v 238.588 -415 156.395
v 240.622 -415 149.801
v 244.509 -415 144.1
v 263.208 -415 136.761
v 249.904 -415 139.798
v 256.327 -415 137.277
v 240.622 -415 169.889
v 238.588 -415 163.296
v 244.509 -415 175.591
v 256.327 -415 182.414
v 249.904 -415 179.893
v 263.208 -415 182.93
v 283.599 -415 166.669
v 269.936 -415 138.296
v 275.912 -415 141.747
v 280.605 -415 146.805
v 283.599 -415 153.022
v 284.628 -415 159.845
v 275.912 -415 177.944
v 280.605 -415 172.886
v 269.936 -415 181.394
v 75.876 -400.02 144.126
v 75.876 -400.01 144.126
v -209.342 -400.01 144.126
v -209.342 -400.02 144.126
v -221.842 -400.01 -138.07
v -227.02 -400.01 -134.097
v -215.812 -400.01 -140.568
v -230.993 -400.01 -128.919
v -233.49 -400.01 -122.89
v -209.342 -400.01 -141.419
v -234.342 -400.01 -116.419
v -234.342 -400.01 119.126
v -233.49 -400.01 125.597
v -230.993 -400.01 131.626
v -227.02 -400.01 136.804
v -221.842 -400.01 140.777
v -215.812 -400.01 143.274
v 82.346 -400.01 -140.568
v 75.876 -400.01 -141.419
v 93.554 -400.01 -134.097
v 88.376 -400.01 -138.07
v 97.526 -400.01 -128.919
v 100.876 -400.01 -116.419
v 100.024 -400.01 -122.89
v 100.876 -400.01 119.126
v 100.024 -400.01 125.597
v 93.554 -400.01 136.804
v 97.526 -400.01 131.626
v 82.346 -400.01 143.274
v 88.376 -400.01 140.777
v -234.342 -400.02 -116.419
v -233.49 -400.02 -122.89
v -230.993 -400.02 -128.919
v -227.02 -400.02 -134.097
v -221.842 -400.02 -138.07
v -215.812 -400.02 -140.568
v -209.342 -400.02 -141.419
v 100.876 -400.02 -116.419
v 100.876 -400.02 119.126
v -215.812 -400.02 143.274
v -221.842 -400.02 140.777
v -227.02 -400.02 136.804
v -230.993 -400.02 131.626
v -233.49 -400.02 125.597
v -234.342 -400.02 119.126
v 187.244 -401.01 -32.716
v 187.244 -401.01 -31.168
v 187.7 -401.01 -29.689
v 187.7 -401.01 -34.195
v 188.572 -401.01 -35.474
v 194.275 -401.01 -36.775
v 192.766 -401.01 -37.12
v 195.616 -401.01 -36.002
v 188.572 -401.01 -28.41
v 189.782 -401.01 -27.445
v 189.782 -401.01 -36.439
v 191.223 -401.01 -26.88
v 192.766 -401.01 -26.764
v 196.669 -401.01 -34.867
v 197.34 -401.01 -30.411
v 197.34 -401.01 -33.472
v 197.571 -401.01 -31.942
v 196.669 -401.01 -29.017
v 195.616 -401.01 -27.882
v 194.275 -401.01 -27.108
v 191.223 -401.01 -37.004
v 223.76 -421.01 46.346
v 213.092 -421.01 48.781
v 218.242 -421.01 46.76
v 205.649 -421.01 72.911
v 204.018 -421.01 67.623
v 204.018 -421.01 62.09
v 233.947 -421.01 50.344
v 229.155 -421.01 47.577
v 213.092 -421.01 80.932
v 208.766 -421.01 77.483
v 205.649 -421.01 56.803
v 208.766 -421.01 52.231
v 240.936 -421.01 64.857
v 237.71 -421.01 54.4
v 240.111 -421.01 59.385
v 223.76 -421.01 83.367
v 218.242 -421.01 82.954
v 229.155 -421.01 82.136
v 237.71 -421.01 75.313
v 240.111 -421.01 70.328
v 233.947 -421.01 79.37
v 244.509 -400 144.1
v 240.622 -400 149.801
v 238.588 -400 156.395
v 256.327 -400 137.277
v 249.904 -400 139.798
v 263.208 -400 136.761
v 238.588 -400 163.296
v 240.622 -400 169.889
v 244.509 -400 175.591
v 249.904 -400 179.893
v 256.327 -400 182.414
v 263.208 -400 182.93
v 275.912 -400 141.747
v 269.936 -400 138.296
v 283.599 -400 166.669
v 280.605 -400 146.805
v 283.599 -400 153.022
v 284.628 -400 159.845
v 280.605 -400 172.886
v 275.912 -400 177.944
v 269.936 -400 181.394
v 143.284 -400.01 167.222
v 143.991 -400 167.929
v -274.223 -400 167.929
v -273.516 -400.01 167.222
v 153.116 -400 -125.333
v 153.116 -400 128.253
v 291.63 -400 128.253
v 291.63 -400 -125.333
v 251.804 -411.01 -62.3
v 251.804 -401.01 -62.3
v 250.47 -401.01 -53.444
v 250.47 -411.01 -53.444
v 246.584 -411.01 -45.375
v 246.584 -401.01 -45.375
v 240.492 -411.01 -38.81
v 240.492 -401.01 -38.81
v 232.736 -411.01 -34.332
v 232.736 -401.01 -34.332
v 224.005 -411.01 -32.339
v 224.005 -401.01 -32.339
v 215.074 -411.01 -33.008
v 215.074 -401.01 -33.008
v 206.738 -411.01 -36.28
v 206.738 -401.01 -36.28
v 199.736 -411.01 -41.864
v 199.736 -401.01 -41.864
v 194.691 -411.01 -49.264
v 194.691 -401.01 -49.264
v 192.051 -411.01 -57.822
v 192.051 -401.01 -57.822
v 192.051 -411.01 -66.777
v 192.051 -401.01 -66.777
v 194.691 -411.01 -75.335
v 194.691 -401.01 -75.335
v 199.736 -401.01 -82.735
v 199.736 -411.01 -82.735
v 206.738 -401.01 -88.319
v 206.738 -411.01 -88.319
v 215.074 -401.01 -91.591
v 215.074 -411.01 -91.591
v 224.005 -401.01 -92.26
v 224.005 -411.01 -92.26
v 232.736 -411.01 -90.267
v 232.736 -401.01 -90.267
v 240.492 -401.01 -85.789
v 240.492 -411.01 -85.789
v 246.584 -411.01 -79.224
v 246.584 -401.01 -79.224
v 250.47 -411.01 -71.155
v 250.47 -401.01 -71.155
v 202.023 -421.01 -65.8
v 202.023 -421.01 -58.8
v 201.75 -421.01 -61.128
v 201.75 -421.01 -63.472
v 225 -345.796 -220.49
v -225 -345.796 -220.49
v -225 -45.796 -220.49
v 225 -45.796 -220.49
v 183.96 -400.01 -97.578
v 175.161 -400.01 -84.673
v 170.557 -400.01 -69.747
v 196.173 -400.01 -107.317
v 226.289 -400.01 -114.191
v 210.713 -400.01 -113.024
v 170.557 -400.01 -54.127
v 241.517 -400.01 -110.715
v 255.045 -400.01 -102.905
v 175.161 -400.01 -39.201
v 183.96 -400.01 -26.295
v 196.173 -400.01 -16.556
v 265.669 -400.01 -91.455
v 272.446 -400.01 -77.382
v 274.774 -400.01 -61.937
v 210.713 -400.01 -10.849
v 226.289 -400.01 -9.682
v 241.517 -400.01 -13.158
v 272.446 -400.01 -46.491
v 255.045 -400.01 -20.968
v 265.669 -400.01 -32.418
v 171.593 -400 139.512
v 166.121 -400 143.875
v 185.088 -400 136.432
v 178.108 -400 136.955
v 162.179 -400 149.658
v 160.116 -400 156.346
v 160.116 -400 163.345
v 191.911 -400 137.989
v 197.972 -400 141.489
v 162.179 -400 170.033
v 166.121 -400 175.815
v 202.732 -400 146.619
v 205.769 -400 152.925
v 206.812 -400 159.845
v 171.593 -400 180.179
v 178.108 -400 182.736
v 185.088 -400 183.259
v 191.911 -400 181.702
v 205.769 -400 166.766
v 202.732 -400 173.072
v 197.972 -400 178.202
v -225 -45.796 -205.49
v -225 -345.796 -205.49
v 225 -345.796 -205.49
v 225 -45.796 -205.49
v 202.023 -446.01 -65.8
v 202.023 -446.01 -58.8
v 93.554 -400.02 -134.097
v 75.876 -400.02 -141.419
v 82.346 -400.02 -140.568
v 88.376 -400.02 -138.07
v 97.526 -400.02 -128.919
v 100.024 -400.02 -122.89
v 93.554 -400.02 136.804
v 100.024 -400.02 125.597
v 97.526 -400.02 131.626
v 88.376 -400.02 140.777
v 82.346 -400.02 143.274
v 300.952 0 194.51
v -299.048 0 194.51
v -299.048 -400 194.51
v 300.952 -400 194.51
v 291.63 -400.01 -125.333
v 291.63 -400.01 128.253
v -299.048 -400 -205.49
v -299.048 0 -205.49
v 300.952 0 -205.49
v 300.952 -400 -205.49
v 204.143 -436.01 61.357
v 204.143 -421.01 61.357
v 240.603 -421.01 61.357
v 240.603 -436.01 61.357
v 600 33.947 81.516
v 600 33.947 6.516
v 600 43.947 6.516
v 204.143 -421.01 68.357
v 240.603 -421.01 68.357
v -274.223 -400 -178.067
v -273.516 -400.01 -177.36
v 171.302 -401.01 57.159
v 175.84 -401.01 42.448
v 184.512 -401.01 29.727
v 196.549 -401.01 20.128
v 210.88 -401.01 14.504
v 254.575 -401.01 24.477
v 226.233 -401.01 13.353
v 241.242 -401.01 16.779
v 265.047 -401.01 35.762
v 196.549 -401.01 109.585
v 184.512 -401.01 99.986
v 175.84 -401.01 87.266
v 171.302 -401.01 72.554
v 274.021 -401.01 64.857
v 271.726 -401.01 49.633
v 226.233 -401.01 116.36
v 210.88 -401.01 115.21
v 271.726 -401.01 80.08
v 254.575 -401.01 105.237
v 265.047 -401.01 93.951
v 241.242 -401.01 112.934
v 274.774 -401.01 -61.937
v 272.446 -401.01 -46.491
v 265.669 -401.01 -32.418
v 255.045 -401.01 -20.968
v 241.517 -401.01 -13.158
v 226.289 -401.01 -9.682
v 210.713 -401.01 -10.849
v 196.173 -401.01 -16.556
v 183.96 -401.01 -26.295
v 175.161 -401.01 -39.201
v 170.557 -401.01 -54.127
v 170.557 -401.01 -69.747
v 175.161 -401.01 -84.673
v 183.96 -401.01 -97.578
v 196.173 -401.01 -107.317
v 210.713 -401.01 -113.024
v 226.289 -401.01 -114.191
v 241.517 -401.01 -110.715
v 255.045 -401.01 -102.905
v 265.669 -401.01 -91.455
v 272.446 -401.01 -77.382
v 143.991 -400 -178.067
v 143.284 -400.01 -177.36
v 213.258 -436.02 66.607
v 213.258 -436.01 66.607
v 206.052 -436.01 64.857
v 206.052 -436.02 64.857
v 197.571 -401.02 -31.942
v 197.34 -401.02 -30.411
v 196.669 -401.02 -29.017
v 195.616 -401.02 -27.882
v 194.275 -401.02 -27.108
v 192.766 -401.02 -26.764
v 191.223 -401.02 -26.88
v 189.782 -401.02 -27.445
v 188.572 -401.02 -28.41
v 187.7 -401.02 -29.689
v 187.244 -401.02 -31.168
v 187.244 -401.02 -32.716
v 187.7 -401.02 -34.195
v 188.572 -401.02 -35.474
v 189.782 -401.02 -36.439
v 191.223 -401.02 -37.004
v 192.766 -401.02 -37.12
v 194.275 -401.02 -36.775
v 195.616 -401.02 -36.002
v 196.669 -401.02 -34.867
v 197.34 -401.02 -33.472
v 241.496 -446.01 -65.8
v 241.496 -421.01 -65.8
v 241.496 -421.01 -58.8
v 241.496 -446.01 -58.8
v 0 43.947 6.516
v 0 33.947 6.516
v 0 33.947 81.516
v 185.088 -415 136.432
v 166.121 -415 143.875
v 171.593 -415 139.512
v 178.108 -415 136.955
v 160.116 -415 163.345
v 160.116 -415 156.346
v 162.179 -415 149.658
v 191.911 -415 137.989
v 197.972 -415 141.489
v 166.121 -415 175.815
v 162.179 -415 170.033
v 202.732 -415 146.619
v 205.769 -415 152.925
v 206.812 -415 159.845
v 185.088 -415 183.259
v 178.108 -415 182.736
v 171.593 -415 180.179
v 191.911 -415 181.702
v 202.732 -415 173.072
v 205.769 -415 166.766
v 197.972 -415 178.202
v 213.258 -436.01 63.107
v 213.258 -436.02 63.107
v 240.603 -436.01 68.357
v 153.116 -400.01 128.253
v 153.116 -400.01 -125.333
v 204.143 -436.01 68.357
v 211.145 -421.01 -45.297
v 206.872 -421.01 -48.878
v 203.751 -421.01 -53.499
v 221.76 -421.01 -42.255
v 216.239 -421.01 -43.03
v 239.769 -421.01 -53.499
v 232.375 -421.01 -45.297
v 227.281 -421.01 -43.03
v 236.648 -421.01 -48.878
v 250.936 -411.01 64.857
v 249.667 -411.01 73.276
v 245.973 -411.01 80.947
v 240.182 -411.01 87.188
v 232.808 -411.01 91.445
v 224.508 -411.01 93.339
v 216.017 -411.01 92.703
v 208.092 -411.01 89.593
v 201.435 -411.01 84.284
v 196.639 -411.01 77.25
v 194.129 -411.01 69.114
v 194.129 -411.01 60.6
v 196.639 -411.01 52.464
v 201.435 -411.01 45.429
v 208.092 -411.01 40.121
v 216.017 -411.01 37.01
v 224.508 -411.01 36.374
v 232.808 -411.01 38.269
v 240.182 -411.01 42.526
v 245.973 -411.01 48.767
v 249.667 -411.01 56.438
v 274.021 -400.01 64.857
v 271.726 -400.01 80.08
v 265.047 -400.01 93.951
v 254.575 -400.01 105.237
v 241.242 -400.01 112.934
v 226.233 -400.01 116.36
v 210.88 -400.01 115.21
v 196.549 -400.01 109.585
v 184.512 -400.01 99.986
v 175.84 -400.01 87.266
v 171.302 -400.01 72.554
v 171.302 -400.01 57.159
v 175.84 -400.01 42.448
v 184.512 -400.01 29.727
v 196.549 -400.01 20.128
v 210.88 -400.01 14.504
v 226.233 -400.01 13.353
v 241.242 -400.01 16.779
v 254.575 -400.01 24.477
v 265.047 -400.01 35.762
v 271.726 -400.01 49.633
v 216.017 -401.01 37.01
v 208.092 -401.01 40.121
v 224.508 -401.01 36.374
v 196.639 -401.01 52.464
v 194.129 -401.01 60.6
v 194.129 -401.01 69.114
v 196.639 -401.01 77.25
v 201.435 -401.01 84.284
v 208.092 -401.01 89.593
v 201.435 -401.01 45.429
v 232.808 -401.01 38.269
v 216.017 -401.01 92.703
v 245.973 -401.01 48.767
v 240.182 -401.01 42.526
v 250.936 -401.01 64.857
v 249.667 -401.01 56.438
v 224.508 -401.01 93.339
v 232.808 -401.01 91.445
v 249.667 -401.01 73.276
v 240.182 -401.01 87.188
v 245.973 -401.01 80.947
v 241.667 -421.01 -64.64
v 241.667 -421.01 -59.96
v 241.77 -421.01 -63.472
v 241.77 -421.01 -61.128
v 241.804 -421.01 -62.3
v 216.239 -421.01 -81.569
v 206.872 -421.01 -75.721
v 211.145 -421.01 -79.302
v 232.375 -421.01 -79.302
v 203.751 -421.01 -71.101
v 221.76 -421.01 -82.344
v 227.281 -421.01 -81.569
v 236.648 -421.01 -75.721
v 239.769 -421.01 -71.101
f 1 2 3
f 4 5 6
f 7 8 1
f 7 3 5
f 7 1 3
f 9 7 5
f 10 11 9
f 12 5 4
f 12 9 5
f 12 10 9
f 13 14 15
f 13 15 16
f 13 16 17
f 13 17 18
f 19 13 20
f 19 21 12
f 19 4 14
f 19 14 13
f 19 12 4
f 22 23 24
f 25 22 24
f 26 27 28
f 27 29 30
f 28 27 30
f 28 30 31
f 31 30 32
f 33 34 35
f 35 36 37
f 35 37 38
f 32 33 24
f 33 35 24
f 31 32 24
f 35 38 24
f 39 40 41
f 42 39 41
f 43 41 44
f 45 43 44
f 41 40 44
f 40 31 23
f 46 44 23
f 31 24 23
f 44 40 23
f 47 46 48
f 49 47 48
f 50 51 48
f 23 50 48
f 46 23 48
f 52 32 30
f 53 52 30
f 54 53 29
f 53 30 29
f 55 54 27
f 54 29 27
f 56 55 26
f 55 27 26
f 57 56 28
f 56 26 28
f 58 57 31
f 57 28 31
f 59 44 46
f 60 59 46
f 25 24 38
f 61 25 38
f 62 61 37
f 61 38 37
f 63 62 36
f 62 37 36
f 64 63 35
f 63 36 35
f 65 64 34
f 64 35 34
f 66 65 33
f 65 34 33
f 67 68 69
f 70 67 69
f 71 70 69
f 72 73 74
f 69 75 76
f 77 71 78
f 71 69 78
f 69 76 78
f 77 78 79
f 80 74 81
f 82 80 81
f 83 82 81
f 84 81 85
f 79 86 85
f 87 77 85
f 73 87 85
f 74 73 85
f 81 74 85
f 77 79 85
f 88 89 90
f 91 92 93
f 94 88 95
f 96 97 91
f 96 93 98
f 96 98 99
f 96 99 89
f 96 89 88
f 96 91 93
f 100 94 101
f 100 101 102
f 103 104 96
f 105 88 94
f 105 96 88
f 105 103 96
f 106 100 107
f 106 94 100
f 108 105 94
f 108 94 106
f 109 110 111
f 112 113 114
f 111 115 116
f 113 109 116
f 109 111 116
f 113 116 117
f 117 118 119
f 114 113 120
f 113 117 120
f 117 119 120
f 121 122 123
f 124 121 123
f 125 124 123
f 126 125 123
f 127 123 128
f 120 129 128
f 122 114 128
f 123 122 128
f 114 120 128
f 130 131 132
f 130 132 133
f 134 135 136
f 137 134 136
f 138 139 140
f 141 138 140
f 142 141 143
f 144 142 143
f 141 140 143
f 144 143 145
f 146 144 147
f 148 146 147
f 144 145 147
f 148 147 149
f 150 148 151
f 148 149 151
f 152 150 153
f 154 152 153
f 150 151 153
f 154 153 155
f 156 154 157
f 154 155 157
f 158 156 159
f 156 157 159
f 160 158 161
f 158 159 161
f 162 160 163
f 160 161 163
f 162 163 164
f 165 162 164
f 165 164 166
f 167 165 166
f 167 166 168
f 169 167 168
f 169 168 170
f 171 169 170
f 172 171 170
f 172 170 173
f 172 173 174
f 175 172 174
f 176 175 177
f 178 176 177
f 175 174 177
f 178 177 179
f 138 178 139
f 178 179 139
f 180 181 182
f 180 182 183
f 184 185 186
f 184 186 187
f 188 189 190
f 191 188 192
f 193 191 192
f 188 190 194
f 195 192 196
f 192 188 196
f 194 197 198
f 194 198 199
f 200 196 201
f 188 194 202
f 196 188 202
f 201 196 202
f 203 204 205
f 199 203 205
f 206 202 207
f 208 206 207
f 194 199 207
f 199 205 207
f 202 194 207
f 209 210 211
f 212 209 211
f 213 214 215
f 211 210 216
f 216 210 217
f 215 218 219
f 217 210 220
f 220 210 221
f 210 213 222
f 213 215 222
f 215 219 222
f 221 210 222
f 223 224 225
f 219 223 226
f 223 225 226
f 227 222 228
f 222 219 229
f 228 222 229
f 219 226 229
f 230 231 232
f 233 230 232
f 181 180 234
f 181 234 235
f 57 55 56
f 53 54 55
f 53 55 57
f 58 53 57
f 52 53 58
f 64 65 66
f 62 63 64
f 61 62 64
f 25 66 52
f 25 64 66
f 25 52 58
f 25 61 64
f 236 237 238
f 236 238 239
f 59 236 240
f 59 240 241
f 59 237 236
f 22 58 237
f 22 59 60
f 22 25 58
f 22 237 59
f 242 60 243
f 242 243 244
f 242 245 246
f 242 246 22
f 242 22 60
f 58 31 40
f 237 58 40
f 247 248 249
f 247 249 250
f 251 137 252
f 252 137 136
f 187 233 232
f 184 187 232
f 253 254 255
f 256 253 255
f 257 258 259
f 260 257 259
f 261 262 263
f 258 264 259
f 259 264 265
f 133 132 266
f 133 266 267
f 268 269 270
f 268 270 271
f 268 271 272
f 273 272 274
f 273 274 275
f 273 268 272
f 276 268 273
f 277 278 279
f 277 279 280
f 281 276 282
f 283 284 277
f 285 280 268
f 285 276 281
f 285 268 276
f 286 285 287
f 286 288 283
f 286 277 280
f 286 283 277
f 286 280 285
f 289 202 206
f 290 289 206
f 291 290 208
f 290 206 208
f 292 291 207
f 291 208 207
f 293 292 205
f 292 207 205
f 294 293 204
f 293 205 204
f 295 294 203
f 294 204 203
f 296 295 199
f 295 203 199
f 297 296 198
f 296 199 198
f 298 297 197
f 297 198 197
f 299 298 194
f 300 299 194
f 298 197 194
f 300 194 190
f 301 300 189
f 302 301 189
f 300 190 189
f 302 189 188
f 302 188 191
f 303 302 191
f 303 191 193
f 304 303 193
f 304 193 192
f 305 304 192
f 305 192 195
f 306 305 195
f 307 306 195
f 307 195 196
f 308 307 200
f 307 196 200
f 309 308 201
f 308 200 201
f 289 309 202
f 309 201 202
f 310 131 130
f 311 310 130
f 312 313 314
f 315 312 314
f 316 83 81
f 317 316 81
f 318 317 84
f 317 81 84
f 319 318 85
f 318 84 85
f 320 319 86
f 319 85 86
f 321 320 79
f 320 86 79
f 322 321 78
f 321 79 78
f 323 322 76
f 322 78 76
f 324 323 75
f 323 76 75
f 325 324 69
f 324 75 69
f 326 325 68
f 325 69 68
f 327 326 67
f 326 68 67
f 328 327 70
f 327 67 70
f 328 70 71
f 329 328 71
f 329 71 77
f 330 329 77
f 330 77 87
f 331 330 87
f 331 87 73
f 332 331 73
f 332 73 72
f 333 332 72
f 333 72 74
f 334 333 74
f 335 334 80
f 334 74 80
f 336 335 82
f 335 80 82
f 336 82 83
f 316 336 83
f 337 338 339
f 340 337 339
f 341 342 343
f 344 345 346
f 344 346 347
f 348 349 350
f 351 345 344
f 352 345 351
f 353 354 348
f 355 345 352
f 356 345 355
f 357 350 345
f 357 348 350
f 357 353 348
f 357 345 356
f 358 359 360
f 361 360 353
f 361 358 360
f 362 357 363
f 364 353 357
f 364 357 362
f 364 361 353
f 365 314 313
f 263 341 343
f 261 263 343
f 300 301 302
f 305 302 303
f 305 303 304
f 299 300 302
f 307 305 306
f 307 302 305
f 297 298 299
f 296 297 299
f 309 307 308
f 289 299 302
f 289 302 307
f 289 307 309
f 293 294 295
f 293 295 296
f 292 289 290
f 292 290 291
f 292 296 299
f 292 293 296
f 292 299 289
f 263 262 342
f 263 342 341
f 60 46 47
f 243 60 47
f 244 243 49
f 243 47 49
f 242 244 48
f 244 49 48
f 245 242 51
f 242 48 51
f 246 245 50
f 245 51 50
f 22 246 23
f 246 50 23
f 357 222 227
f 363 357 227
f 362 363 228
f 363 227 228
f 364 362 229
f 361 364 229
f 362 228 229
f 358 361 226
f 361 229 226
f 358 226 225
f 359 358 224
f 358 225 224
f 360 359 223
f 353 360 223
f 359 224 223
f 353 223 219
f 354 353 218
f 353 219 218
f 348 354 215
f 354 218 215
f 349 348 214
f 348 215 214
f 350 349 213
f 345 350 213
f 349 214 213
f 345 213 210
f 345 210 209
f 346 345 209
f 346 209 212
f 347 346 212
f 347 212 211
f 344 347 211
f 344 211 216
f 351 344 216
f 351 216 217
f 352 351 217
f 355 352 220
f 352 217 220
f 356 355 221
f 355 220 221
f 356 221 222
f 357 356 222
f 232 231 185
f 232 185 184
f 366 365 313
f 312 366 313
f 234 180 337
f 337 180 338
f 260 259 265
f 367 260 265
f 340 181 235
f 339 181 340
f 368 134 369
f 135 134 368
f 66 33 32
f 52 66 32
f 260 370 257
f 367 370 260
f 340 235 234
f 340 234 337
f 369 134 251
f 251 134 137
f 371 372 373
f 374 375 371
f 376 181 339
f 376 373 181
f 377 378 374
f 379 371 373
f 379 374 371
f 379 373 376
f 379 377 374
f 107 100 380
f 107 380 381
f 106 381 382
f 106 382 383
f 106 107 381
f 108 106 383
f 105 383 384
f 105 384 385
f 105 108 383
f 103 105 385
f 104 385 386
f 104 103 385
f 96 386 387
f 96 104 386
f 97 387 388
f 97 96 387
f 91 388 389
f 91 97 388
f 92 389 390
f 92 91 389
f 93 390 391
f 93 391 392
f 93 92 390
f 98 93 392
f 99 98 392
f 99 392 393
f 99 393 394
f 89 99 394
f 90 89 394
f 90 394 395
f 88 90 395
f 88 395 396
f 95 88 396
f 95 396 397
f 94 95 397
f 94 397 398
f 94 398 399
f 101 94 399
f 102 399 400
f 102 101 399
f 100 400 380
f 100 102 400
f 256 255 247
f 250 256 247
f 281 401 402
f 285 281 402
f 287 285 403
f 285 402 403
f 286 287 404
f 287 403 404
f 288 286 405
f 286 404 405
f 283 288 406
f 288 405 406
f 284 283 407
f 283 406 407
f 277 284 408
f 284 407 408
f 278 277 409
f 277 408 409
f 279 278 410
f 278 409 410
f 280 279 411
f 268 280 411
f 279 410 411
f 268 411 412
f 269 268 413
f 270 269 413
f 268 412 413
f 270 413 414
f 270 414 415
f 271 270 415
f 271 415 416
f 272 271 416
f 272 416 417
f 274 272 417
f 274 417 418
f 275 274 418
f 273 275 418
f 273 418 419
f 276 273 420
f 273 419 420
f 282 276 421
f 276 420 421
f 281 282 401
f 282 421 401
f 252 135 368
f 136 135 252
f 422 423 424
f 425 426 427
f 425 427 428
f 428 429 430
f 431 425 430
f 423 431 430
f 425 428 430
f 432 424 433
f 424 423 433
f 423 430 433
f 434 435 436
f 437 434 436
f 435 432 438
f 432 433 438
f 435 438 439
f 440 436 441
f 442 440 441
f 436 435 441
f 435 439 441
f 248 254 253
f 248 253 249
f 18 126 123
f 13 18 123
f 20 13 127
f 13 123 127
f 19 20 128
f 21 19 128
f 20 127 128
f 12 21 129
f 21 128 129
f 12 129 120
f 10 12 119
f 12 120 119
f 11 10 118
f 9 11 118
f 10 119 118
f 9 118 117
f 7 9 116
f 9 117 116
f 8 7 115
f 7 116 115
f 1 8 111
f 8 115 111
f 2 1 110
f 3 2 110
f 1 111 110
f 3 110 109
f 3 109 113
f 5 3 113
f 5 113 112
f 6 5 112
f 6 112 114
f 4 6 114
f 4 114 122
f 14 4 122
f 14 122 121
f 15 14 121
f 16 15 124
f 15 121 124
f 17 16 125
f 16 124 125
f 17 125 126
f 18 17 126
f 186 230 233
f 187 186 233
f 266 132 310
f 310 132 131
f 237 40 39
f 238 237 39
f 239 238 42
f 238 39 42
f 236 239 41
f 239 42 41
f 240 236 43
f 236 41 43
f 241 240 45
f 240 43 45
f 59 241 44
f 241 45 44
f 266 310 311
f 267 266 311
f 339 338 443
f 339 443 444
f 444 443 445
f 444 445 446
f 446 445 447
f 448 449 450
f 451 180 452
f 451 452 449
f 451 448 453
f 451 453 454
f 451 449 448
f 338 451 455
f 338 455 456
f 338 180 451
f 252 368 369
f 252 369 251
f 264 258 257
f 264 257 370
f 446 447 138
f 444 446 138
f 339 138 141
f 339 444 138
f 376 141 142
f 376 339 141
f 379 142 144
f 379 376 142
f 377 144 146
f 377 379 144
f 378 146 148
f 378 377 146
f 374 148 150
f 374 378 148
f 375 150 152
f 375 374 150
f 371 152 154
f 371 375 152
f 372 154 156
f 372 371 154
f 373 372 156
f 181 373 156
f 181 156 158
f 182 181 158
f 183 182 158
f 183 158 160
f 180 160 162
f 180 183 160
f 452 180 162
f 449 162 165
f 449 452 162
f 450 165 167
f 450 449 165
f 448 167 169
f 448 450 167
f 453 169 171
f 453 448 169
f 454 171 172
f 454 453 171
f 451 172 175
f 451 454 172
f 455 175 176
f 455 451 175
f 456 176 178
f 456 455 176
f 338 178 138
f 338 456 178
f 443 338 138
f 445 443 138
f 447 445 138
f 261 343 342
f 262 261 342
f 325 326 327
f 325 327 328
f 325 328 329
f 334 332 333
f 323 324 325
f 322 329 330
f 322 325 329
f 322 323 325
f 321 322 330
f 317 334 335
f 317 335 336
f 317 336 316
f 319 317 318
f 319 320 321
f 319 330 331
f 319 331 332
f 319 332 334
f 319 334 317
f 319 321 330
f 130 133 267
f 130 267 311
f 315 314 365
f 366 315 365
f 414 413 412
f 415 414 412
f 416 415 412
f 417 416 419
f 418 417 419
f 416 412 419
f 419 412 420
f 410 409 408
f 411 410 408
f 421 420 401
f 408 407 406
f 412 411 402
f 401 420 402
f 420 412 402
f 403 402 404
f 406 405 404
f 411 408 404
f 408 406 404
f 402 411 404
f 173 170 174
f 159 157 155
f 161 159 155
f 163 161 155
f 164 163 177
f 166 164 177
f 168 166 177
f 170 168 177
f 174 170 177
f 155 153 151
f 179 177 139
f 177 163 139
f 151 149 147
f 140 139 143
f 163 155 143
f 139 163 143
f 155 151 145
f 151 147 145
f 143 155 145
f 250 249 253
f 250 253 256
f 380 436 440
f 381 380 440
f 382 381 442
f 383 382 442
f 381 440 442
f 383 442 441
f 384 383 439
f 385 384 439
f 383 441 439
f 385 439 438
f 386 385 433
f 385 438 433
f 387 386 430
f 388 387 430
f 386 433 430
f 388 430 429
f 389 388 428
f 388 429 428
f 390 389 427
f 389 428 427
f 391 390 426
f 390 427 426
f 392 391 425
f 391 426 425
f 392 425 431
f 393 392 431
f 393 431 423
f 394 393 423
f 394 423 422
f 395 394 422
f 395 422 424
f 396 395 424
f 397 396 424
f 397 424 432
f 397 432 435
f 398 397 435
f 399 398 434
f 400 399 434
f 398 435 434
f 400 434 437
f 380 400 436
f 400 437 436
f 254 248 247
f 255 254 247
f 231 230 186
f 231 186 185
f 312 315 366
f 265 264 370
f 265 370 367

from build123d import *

# Parameters (mm, degrees)
F0_W        = 600
F0_H        = 400
F1_DEPTH    = 400
F3_W        = 418.2137697935
F3_H        = 345.9964096546
F4_DEPTH    = 0.01
F5_T1_DEPTH = 349.5315899895
F5_T3_DEPTH = 421.7489501284
F7_DEPTH    = 0.01
F8_R        = 23.4792892743
F9_DEPTH    = 15
F8_R_2      = 23.149137583
F10_W       = 138.5136842728
F10_H       = 253.5866200924
F11_DEPTH   = 0.01
F12_R       = 51.6479650584
F13_DEPTH   = 1
F12_R_2     = 52.4009870451
F14_R       = 28.5626068182
F15_DEPTH   = 20
F14_R_2     = 30.0445594594
F16_SIZE    = 10
F16_2_SIZE  = 10
F17_W       = 36.4593127685
F17_H       = 7
F18_DEPTH   = 15
F19_W       = 39.4732498749
F19_H       = 7
F20_DEPTH   = 25
F21_W       = 450
F21_H       = 300
F22_DEPTH   = 15
F23_R       = 5.1925071587
F24_DEPTH   = 0.01
F26_DEPTH   = 0.01
F28_DEPTH   = 600


# Not quite as in the source:
# - a fillet or chamfer that OpenCascade refuses, or shapes differently, is made with other operations: its cross-section is extruded or revolved along the edge and cut away or added
# - a feature names something its author has since deleted; it is built from what else it names


with BuildPart() as f1:
    # F0 (on Front) → F1 (new body)
    with BuildSketch(Plane.XZ):
        with Locations((0.952295959, -5.4897558531)):
            Rectangle(F0_W, F0_H)
    extrude(amount=F1_DEPTH)


with BuildPart() as f4:
    # F3 (on face) → F4 (new body)
    with BuildSketch(Plane.XZ.offset(400)):
        with Locations((-65.1162043214, -5.0687789917)):
            Rectangle(F3_W, F3_H)
    extrude(amount=F4_DEPTH)

    # F5: fillet of radius 25 on 4 edges, made by hand

    # F5_s2 → F5_t1 (cut)
    with BuildSketch(Plane.XY.offset(-179.8345739864)):
        with BuildLine():
            ThreePointArc((143.9906805754, -400), (143.637197899, -400.007499875), (143.2836445084, -400.01))
            Line((143.2836445084, -400.01), (143.9906805754, -400.01))
            Line((143.9906805754, -400.01), (143.9906805754, -400))
        make_face()
        with BuildLine():
            ThreePointArc((-274.2230892181, -400), (-273.8696065418, -400.007499875), (-273.5160531512, -400.01))
            Line((-273.5160531512, -400.01), (-274.2230892181, -400.01))
            Line((-274.2230892181, -400.01), (-274.2230892181, -400))
        make_face()
    extrude(amount=F5_T1_DEPTH, mode=Mode.SUBTRACT)

    # F5_s4 → F5_t3 (cut)
    with BuildSketch(Plane.YZ.offset(-275.9906793856)):
        with BuildLine():
            ThreePointArc((-400, 167.9294258356), (-400.007499875, 167.5759431592), (-400.01, 167.2223897686))
            Line((-400.01, 167.2223897686), (-400.01, 167.9294258356))
            Line((-400.01, 167.9294258356), (-400, 167.9294258356))
        make_face()
        with BuildLine():
            ThreePointArc((-400, -178.066983819), (-400.007499875, -177.7135011426), (-400.01, -177.359947752))
            Line((-400.01, -177.359947752), (-400.01, -178.066983819))
            Line((-400.01, -178.066983819), (-400, -178.066983819))
        make_face()
    extrude(amount=F5_T3_DEPTH, mode=Mode.SUBTRACT)


with BuildPart() as f7:
    # F6 (on face) → F7 (new body)
    with BuildSketch(Plane.XZ.offset(400.01)):
        with BuildLine():
            Line((75.8758544922, 144.1260868311), (-209.3418747187, 144.1260868311))
            ThreePointArc((-209.3418747187, 144.1260868311), (-227.0195442483, 136.8037563608), (-234.3418747187, 119.1260868311))
            Line((-234.3418747187, 119.1260868311), (-234.3418747187, -116.4193958044))
            ThreePointArc((-234.3418747187, -116.4193958044), (-227.0195442483, -134.0970653341), (-209.3418747187, -141.4193958044))
            Line((-209.3418747187, -141.4193958044), (75.8758544922, -141.4193958044))
            ThreePointArc((75.8758544922, -141.4193958044), (93.5535240219, -134.0970653341), (100.8758544922, -116.4193958044))
            Line((100.8758544922, -116.4193958044), (100.8758544922, 119.1260868311))
            ThreePointArc((100.8758544922, 119.1260868311), (93.5535240219, 136.8037563608), (75.8758544922, 144.1260868311))
        make_face()
    extrude(amount=F7_DEPTH)


with BuildPart() as f9:
    # F8 (on face) → F9 (new body)
    with BuildSketch(Plane.XZ.offset(400)):
        with Locations((183.3329312503, 159.8454117775)):
            Circle(F8_R)
    extrude(amount=F9_DEPTH)


with BuildPart() as f9b:
    # F8 (on face) → F9, piece 2 (new body)
    with BuildSketch(Plane.XZ.offset(400)):
        with Locations((261.4785395563, 159.8454117775)):
            Circle(F8_R_2)
    extrude(amount=F9_DEPTH)


with BuildPart() as f11:
    # F10 (on face) → F11 (new body)
    with BuildSketch(Plane.XZ.offset(400)):
        with Locations((222.3730683327, 1.4600753784)):
            Rectangle(F10_W, F10_H)
    extrude(amount=F11_DEPTH)


with BuildPart() as f13:
    # F12 (on face) → F13 (new body)
    with BuildSketch(Plane.XZ.offset(400.01)):
        with Locations((222.3730683327, 64.8567304015)):
            Circle(F12_R)
    extrude(amount=F13_DEPTH)


with BuildPart() as f13b:
    # F12 (on face) → F13, piece 2 (new body)
    with BuildSketch(Plane.XZ.offset(400.01)):
        with Locations((222.3730683327, -61.9365796447)):
            Circle(F12_R_2)
    extrude(amount=F13_DEPTH)


with BuildPart() as f15:
    # F14 (on face) → F15 (new body)
    with BuildSketch(Plane.XZ.offset(401.01)):
        with Locations((222.3730683327, 64.8567304015)):
            Circle(F14_R)
    extrude(amount=F15_DEPTH)

    # F16
    f16_edges = [f15.edges().sort_by_distance(p)[0] for p in [
        (193.810462, -421.01, 64.85673),
    ]]
    chamfer(f16_edges, length=F16_SIZE)


with BuildPart() as f15b:
    # F14 (on face) → F15, piece 2 (new body)
    with BuildSketch(Plane.XZ.offset(401.01)):
        with Locations((221.7598557472, -62.2995458543)):
            Circle(F14_R_2)
    extrude(amount=F15_DEPTH)

    # F16#2
    f16_2_edges = [f15b.edges().sort_by_distance(p)[0] for p in [
        (191.715296, -421.01, -62.299546),
    ]]
    chamfer(f16_2_edges, length=F16_2_SIZE)

    # F19 (on face) → F20 (join)
    with BuildSketch(Plane.XZ.offset(421.01)):
        with Locations((221.7598557472, -62.2995458543)):
            Rectangle(F19_W, F19_H)
    extrude(amount=F20_DEPTH)


with BuildPart() as f18:
    # F17 (on face) → F18 (new body)
    with BuildSketch(Plane.XZ.offset(421.01)):
        with Locations((222.3730683327, 64.8567304015)):
            Rectangle(F17_W, F17_H)
    extrude(amount=F18_DEPTH)


with BuildPart() as f22:
    # F21 (on face) → F22 (new body)
    with BuildSketch(Plane(origin=(0, 0, -205.4897558531), x_dir=(1, 0, 0), z_dir=(0, 0, -1))):
        with Locations((0, 195.795734788)):
            Rectangle(F21_W, F21_H)
    extrude(amount=F22_DEPTH)


with BuildPart() as f24:
    # F23 (on face) → F24 (new body)
    with BuildSketch(Plane.XZ.offset(401.01)):
        with Locations((192.378346444, -31.941857756)):
            Circle(F23_R)
    extrude(amount=F24_DEPTH)


with BuildPart() as f26:
    # F25 (on face) → F26 (new body)
    with BuildSketch(Plane.XZ.offset(436.01)):
        Polygon((213.2582401405, 63.1067304015), (213.2582401405, 66.6067304015), (206.0518860817, 64.8567304015), align=None)
    extrude(amount=F26_DEPTH)


with BuildPart() as f28:
    # F27 (on Right) → F28 (new body)
    with BuildSketch(Plane.YZ):
        Polygon((43.9466453344, 6.5159001984), (33.9466453344, 81.5159001984), (33.9466453344, 6.5159001984), align=None)
    extrude(amount=F28_DEPTH)


solid = Compound([f1.part, f4.part, f7.part, f9.part, f9b.part, f11.part, f13.part, f13b.part, f15.part, f15b.part, f18.part, f22.part, f24.part, f26.part, f28.part])
